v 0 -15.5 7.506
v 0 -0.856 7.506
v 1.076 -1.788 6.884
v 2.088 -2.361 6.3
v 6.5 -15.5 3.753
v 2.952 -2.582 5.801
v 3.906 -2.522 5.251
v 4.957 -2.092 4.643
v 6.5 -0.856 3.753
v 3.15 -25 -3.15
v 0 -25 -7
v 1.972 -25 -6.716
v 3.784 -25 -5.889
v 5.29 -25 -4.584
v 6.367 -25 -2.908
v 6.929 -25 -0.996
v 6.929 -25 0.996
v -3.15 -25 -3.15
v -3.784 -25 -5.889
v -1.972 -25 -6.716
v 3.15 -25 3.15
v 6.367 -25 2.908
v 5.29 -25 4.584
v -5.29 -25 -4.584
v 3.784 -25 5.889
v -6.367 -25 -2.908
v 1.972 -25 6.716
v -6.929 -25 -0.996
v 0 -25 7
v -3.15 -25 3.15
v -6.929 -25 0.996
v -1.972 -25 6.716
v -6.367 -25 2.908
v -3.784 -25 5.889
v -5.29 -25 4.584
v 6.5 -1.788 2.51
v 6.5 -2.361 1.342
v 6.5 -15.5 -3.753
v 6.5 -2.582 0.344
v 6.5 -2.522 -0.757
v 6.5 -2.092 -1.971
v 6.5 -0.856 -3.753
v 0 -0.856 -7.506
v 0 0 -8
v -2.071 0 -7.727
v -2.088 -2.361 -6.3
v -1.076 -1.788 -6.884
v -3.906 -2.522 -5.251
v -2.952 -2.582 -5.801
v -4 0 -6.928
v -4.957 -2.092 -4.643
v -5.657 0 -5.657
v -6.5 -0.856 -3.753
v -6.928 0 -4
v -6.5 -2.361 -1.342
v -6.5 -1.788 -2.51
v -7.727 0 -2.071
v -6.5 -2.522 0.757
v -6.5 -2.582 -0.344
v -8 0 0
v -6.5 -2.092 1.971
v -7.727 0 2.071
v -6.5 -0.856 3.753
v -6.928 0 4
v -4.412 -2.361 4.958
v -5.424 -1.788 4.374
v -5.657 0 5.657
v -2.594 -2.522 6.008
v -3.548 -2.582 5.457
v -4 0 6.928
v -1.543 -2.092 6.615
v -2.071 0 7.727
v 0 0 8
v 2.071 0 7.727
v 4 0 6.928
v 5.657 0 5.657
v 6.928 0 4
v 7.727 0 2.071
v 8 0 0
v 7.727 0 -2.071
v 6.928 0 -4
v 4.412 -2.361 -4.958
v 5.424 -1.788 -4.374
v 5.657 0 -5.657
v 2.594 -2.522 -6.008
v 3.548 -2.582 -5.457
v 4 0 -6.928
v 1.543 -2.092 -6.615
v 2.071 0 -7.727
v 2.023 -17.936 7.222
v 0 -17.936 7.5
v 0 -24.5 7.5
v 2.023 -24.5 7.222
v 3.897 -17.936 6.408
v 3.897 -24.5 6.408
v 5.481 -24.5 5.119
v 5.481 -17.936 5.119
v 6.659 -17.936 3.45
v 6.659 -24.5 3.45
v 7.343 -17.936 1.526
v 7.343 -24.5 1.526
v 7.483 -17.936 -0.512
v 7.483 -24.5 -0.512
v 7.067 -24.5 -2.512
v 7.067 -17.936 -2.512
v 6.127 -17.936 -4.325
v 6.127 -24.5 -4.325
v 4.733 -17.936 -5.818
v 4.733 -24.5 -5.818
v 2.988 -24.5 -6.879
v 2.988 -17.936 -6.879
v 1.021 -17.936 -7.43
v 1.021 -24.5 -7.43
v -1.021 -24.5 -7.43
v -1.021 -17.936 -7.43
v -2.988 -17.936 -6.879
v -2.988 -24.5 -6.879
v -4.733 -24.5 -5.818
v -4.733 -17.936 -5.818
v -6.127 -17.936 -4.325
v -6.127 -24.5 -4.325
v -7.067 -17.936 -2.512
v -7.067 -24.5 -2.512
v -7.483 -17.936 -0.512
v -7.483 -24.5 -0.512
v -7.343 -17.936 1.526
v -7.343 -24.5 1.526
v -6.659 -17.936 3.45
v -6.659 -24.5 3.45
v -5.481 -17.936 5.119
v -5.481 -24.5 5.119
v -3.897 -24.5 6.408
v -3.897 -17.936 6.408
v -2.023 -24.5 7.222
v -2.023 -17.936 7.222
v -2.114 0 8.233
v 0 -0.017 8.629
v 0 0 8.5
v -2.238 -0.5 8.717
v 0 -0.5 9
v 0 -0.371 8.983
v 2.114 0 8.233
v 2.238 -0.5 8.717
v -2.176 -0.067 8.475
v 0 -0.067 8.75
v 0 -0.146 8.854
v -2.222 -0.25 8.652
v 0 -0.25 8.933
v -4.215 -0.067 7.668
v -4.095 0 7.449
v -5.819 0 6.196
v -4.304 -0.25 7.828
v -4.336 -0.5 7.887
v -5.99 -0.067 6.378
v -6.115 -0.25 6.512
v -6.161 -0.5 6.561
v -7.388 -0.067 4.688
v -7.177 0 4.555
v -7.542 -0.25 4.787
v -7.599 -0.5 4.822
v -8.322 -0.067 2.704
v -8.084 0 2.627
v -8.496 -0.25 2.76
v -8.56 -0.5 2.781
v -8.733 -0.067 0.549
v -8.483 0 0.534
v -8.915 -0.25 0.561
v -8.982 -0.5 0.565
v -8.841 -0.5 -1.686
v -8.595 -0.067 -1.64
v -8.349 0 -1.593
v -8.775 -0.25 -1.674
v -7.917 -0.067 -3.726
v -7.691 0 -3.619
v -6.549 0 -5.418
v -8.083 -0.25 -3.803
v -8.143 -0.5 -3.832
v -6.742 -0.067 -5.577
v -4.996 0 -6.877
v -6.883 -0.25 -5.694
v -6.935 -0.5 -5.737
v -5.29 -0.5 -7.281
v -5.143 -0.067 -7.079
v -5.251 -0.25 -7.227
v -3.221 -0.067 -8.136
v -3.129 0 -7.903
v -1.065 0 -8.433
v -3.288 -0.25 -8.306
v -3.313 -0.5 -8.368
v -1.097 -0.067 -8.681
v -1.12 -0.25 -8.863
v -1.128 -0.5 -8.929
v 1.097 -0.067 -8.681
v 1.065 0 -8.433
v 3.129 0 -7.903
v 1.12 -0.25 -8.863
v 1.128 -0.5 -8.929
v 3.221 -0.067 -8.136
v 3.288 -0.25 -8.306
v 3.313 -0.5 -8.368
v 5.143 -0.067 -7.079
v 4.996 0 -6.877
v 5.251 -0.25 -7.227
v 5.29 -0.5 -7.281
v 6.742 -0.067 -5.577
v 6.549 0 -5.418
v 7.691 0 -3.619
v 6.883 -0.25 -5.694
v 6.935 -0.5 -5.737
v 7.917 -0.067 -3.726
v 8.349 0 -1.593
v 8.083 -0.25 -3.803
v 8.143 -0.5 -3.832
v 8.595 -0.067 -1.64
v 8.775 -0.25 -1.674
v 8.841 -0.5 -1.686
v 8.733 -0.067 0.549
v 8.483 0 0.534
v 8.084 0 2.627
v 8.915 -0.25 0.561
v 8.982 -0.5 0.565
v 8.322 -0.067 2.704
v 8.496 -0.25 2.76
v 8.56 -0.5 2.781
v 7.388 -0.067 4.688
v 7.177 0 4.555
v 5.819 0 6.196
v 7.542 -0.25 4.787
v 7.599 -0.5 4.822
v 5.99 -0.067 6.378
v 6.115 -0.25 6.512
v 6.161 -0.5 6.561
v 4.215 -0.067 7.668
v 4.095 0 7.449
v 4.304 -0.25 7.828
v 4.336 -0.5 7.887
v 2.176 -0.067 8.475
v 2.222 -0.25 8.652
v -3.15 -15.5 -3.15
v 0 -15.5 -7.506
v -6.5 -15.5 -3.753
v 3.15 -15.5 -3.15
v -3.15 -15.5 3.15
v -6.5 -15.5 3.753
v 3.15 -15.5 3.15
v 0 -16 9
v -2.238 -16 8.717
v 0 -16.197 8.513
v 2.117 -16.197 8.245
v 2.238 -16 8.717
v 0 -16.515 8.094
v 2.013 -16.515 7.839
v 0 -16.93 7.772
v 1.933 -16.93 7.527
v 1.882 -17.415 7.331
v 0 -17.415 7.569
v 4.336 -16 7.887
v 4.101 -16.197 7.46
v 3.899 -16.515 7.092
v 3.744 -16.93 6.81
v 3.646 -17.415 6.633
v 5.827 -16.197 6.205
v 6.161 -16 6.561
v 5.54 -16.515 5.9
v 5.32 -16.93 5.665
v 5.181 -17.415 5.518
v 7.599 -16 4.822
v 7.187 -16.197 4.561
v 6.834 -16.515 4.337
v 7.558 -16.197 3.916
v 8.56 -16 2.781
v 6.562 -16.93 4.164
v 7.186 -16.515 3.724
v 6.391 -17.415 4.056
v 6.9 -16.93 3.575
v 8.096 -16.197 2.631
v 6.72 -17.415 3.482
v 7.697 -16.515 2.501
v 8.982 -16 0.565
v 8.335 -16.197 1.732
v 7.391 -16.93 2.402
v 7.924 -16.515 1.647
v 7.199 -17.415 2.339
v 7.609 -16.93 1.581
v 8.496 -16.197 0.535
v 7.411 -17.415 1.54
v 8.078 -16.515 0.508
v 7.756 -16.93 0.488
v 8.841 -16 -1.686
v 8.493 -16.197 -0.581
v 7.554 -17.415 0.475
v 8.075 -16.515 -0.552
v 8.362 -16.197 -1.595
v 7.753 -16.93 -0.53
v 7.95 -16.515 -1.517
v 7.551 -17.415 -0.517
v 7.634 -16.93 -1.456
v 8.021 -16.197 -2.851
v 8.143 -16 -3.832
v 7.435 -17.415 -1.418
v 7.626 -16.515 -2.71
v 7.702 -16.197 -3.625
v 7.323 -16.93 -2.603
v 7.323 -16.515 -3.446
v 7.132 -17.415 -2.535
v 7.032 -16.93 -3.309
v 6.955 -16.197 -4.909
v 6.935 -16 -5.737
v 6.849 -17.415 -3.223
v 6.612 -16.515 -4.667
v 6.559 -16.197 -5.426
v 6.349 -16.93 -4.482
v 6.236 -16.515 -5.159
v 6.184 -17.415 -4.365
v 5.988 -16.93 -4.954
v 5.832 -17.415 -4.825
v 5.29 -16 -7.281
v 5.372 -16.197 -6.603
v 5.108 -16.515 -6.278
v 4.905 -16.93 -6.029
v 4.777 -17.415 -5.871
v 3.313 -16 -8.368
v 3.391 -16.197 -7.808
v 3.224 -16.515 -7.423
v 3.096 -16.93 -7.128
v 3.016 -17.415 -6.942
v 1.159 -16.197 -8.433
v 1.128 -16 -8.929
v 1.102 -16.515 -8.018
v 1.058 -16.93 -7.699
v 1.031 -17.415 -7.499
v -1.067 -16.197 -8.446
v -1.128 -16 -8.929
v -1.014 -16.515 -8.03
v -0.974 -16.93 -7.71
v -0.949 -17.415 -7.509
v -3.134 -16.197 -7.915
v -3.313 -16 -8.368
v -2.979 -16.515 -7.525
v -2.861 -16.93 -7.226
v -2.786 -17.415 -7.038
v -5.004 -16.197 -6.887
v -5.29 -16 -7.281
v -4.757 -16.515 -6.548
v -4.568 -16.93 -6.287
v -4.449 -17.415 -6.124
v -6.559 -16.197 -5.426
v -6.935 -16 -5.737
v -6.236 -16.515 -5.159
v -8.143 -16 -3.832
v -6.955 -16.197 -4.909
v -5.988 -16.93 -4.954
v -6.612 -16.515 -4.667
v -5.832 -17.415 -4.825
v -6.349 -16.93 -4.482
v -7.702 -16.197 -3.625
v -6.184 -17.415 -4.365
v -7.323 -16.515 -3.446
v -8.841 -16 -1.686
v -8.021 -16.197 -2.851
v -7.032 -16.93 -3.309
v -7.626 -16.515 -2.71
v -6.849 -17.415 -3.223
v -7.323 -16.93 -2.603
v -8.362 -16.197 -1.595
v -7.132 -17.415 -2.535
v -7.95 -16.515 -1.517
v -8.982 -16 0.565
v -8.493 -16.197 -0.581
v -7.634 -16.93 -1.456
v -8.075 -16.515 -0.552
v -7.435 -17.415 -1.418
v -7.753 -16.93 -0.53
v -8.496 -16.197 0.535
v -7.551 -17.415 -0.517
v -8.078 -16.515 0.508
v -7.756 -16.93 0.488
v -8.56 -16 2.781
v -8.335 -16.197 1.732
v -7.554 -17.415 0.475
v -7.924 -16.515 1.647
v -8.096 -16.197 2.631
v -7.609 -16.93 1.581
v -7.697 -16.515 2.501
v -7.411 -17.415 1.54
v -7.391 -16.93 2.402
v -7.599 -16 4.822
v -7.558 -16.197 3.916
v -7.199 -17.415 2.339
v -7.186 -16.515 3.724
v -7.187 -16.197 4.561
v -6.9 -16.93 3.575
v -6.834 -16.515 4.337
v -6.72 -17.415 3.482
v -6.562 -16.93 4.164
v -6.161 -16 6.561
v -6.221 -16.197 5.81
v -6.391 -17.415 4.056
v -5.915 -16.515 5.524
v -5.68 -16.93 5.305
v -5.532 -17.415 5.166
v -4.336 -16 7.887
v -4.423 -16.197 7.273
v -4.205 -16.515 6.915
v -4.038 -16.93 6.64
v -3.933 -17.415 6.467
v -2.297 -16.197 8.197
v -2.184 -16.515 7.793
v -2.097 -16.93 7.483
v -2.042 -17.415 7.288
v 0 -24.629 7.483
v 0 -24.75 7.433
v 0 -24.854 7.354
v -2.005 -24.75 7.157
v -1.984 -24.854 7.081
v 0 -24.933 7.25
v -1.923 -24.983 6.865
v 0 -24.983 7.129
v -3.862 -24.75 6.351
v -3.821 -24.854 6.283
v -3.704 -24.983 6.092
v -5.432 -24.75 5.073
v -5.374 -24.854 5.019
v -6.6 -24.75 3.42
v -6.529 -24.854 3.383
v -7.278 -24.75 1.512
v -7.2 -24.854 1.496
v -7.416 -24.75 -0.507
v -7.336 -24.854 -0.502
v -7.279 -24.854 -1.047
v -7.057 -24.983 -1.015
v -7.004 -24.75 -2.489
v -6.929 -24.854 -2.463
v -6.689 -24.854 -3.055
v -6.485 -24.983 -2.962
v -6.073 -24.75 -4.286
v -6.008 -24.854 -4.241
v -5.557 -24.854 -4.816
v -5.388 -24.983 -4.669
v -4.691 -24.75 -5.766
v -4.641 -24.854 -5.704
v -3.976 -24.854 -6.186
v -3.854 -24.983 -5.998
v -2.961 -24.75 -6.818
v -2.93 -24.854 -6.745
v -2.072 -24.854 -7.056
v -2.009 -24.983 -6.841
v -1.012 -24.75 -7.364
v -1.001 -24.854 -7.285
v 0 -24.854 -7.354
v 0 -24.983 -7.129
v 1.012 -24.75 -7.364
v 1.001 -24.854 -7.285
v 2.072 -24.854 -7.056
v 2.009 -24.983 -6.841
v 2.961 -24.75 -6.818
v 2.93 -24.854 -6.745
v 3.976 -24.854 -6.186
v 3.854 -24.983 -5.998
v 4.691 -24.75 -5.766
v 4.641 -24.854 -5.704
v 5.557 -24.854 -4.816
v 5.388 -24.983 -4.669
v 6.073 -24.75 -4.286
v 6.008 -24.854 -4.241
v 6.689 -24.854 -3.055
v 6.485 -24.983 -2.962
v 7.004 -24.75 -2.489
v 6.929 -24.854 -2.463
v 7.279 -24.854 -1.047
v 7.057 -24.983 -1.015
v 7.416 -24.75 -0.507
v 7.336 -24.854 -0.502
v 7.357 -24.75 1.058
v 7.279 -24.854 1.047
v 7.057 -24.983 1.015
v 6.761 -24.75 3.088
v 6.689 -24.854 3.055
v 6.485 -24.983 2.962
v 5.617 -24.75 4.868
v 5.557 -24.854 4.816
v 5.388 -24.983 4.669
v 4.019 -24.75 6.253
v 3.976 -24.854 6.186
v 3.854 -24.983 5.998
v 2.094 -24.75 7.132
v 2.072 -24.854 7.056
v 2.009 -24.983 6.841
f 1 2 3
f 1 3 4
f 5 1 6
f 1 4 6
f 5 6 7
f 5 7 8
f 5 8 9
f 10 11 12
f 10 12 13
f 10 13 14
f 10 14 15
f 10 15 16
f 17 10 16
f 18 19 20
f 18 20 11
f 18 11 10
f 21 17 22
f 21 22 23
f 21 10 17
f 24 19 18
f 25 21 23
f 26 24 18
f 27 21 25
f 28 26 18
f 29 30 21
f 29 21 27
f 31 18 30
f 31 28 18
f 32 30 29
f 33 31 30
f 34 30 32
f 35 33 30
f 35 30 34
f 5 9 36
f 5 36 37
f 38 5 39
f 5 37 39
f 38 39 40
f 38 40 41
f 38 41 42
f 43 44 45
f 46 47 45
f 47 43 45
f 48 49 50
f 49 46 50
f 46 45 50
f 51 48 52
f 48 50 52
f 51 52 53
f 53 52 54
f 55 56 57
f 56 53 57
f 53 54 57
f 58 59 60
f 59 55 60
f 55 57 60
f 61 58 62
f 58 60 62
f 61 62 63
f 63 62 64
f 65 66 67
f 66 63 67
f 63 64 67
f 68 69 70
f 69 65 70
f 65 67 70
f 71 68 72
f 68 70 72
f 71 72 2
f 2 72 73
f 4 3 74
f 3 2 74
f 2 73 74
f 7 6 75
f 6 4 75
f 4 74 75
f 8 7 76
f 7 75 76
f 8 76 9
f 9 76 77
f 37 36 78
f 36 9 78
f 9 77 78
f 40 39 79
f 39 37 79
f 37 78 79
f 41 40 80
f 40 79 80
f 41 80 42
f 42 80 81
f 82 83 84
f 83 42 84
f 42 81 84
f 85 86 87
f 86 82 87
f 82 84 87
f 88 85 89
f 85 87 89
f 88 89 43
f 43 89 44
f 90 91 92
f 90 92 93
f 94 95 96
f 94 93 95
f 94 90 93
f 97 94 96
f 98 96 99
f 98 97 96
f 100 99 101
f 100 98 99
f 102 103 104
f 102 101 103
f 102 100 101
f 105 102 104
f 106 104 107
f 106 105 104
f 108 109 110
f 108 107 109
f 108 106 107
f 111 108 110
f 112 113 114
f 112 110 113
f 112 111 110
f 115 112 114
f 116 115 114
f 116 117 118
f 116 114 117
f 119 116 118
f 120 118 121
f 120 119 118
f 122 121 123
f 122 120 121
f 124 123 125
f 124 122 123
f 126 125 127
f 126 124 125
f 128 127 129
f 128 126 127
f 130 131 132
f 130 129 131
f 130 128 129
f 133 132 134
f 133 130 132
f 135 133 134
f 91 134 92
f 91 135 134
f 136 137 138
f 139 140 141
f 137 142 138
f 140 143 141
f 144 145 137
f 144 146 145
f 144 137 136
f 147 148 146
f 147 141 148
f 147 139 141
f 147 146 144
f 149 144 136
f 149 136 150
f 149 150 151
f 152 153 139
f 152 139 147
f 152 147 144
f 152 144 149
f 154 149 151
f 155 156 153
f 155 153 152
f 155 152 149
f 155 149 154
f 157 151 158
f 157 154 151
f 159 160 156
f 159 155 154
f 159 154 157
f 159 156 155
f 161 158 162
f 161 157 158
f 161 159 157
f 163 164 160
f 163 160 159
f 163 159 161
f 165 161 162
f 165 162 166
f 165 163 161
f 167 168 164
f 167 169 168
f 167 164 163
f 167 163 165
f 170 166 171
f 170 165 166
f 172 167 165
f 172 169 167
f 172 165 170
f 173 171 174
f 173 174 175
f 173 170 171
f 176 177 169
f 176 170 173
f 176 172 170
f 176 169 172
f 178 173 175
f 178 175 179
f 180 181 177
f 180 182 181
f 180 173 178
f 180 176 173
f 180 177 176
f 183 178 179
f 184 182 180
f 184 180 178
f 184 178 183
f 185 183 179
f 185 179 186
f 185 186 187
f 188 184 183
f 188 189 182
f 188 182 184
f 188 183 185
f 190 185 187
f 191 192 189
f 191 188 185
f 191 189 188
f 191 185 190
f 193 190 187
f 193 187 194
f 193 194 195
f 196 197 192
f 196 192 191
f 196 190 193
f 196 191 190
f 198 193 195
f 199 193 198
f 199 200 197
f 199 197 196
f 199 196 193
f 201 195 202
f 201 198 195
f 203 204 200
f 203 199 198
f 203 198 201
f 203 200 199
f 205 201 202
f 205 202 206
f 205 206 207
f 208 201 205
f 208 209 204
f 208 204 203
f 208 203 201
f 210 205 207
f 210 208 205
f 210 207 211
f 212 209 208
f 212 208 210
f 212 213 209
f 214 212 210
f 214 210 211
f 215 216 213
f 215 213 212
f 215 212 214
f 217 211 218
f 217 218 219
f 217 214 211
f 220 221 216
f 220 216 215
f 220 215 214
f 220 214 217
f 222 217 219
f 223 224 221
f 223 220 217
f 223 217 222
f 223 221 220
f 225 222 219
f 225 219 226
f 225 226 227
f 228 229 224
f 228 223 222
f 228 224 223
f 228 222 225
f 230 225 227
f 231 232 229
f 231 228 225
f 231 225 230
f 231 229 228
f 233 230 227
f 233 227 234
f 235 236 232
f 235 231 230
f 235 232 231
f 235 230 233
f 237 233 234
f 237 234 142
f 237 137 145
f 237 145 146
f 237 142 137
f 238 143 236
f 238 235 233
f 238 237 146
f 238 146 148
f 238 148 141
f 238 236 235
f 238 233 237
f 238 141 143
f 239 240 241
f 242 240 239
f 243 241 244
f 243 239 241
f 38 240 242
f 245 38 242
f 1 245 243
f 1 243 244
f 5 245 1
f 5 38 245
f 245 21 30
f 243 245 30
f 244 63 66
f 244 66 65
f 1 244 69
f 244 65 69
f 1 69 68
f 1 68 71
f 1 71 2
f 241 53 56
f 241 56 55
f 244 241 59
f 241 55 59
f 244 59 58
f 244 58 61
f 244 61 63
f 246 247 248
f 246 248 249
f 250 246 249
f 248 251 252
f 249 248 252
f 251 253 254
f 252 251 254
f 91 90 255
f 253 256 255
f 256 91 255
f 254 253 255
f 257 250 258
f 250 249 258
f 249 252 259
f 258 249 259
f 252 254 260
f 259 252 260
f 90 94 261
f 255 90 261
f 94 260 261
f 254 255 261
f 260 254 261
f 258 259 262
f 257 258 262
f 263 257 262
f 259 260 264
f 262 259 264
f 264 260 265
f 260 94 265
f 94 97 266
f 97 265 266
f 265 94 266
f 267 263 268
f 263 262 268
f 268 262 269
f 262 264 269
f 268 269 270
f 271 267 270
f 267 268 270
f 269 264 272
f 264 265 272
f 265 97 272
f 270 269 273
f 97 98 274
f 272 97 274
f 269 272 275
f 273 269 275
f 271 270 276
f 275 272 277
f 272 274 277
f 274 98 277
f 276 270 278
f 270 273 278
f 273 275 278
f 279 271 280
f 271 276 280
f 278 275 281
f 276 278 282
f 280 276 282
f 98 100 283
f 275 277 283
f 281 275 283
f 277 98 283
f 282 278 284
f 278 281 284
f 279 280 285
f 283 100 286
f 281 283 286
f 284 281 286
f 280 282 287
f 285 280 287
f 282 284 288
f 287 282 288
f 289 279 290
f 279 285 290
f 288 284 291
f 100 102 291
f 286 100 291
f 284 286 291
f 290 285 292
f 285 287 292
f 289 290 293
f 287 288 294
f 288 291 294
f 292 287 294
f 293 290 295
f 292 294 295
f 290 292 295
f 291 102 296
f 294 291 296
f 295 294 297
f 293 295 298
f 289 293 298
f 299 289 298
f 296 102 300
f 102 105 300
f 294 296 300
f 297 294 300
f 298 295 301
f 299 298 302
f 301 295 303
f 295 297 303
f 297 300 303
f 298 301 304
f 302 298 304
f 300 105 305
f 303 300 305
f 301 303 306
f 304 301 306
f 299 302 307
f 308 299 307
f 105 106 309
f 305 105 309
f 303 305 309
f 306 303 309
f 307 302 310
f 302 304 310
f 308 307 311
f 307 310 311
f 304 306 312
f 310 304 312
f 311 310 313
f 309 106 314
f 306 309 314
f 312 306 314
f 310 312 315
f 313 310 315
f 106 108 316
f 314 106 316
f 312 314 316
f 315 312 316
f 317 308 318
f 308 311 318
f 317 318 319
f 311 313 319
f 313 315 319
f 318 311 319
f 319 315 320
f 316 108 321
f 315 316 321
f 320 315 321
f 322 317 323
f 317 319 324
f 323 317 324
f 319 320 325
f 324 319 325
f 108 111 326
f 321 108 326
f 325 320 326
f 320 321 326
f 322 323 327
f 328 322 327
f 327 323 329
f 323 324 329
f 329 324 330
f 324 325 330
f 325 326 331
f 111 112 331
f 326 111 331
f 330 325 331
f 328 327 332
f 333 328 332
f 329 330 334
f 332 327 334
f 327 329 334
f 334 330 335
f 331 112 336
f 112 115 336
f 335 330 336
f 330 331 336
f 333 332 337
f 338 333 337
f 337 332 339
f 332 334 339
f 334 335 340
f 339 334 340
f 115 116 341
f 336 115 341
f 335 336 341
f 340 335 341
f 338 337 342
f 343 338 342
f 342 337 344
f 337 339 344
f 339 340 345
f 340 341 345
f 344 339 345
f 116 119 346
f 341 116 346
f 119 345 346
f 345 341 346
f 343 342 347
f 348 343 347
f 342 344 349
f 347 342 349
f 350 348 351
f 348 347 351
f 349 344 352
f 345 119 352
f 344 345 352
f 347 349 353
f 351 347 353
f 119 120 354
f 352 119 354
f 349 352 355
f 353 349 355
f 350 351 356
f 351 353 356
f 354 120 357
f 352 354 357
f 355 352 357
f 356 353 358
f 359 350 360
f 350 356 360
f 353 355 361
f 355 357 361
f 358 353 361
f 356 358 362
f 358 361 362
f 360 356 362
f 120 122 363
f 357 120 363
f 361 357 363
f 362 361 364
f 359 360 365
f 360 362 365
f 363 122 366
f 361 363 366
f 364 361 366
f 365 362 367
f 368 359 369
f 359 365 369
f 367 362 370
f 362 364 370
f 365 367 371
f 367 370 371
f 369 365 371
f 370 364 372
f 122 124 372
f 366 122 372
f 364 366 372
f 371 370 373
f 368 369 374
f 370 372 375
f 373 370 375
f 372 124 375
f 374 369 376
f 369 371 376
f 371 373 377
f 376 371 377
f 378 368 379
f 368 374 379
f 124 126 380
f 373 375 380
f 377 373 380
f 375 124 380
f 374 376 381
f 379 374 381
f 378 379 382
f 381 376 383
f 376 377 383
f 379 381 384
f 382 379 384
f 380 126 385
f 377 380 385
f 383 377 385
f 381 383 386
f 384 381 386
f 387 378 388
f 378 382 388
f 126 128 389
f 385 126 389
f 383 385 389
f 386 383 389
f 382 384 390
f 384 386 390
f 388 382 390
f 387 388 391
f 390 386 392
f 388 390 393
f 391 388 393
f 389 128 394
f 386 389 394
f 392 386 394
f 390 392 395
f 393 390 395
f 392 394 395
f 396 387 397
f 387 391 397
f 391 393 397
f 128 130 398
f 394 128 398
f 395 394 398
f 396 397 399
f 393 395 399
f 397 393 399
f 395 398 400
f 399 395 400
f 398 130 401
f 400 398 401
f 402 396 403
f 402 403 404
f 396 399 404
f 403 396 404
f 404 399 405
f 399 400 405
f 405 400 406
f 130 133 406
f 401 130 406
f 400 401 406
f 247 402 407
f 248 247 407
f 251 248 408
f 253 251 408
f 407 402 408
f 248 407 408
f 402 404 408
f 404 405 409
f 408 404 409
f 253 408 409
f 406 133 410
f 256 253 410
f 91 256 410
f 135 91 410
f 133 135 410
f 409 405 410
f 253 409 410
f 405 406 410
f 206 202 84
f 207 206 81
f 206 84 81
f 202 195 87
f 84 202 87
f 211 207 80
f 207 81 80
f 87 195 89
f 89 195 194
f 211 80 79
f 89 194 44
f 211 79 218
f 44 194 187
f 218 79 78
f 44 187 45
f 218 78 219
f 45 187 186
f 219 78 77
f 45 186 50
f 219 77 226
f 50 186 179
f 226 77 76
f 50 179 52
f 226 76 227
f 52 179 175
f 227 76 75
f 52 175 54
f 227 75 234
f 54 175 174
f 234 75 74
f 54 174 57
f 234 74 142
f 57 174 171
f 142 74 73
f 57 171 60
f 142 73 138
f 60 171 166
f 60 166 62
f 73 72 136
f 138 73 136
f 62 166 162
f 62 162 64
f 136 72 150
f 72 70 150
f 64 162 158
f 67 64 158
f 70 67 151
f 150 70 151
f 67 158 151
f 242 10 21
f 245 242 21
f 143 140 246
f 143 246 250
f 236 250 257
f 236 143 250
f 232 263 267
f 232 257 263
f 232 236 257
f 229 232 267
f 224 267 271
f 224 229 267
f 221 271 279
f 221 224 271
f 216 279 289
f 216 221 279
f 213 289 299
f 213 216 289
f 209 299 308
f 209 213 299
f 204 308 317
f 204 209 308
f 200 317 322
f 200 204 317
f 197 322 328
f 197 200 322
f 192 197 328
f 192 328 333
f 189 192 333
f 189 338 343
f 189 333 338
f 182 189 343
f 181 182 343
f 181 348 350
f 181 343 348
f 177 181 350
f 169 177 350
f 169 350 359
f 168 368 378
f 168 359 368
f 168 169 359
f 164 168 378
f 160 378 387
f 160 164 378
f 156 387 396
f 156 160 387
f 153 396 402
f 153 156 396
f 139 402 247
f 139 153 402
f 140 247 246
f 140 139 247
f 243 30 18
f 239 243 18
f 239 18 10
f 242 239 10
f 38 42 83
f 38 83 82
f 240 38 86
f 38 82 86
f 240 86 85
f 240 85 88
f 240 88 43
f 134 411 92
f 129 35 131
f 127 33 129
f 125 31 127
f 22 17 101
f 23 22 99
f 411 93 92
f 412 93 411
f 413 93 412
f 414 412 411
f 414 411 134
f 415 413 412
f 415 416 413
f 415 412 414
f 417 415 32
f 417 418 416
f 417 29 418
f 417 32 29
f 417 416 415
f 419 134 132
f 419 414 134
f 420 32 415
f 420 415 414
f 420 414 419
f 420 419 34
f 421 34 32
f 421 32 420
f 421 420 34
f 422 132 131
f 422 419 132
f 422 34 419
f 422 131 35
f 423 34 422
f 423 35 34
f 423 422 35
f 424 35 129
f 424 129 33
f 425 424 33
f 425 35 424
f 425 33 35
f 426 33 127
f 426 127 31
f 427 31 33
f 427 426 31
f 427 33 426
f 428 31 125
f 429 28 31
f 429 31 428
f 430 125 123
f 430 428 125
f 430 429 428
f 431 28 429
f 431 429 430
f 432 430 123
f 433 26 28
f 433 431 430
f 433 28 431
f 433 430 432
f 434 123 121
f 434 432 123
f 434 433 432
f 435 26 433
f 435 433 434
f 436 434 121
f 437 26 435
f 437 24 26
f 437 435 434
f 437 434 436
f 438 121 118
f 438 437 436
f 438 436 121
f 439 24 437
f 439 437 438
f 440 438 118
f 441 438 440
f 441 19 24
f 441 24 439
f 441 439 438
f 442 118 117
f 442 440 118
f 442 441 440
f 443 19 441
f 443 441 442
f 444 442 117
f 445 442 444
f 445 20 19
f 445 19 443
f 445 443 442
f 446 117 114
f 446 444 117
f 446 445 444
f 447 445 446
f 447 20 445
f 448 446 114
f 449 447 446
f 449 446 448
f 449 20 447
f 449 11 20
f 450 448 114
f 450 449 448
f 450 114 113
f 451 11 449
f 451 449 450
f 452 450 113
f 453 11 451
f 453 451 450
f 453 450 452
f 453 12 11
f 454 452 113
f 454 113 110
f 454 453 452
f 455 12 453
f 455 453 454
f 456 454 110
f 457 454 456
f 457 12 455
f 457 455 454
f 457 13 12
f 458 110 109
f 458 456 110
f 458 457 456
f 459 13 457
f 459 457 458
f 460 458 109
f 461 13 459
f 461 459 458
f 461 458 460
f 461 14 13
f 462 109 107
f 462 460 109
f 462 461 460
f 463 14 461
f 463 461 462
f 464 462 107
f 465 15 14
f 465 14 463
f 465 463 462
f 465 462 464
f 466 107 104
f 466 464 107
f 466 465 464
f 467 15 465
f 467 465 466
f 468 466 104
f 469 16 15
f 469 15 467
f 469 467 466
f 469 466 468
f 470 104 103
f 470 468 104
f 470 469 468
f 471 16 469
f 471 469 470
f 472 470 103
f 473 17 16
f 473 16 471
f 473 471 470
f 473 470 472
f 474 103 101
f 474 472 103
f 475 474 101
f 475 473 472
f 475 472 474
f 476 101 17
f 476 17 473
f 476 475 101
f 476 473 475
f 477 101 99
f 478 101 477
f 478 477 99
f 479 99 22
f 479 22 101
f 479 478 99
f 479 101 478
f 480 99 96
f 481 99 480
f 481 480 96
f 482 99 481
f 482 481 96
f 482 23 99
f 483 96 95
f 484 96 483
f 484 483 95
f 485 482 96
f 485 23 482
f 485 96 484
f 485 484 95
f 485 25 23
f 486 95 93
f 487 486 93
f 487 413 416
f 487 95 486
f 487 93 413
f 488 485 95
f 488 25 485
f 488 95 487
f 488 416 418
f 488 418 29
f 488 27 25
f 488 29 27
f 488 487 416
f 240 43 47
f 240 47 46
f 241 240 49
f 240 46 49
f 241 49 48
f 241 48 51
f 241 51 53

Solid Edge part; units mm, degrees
sketch "Sketch1" plane through (0, 0, 0) normal (1, 0, 0) x (0, 1, 0)
  line L0 (-25, 7.5) -> (-16, 7.5)
  line L1 (-16, 7.5) -> (-16, 9)
  line L2 (-16, 9) -> (0, 9)
  line L3 (0, 9) -> (0, 0)
  line L4 (-25, 0) -> (-25, 7.5)
  dimension "D1" = 25
  dimension "D2" = 16
revolve "RevolvedProtrusion1" add sketch "Sketch1" angle 360 about axis through (0, 0, 0) along (0, -1, 0)
sketch "Sketch2" plane through (0, 0, 0) normal (0, 1, 0) x (-1, 0, 0)
  line L0 (0, -7.5056) -> (6.5, -3.7528)
  line L1 (6.5, -3.7528) -> (6.5, 3.7528)
  line L2 (6.5, 3.7528) -> (0, 7.5056)
  line L3 (0, 7.5056) -> (-6.5, 3.7528)
  line L4 (-6.5, 3.7528) -> (-6.5, -3.7528)
  line L5 (-6.5, -3.7528) -> (0, -7.5056)
  dimension "D1" = 13
extrude "Cutout1" cut sketch "Sketch2" against normal blind 15.5
sketch "Sketch3" plane through (0, -25, 0) normal (0, -1, 0) x (1, 0, 0)
  line L0 (3.15, 3.15) -> (-3.15, 3.15)
  line L1 (-3.15, 3.15) -> (-3.15, -3.15)
  line L2 (-3.15, -3.15) -> (3.15, -3.15)
  line L3 (3.15, -3.15) -> (3.15, 3.15)
  dimension "D1" = 6.3
extrude "Extrusionsausschnitt_2" cut sketch "Sketch3" against normal blind 51.1789
fillet "Verrundung_1" radius 0.5 2 edges at (0, -25, 7.5) (0, 0, 9)
fillet "Verrundung_2" radius 2 1 edges at (0, -16, 7.5)
sketch "Sketch4" plane through (0, 0, 0) normal (1, 0, 0) x (0, 1, 0)
  line L0 (0, -8) -> (-13.8564, 0)
  line L1 (0, 0) -> (0, -8)
  dimension "D1" = 8
revolve "RevolvedCutout1" cut sketch "Sketch4" angle 360 about axis through (0, 0, 0) along (0, -1, 0)
